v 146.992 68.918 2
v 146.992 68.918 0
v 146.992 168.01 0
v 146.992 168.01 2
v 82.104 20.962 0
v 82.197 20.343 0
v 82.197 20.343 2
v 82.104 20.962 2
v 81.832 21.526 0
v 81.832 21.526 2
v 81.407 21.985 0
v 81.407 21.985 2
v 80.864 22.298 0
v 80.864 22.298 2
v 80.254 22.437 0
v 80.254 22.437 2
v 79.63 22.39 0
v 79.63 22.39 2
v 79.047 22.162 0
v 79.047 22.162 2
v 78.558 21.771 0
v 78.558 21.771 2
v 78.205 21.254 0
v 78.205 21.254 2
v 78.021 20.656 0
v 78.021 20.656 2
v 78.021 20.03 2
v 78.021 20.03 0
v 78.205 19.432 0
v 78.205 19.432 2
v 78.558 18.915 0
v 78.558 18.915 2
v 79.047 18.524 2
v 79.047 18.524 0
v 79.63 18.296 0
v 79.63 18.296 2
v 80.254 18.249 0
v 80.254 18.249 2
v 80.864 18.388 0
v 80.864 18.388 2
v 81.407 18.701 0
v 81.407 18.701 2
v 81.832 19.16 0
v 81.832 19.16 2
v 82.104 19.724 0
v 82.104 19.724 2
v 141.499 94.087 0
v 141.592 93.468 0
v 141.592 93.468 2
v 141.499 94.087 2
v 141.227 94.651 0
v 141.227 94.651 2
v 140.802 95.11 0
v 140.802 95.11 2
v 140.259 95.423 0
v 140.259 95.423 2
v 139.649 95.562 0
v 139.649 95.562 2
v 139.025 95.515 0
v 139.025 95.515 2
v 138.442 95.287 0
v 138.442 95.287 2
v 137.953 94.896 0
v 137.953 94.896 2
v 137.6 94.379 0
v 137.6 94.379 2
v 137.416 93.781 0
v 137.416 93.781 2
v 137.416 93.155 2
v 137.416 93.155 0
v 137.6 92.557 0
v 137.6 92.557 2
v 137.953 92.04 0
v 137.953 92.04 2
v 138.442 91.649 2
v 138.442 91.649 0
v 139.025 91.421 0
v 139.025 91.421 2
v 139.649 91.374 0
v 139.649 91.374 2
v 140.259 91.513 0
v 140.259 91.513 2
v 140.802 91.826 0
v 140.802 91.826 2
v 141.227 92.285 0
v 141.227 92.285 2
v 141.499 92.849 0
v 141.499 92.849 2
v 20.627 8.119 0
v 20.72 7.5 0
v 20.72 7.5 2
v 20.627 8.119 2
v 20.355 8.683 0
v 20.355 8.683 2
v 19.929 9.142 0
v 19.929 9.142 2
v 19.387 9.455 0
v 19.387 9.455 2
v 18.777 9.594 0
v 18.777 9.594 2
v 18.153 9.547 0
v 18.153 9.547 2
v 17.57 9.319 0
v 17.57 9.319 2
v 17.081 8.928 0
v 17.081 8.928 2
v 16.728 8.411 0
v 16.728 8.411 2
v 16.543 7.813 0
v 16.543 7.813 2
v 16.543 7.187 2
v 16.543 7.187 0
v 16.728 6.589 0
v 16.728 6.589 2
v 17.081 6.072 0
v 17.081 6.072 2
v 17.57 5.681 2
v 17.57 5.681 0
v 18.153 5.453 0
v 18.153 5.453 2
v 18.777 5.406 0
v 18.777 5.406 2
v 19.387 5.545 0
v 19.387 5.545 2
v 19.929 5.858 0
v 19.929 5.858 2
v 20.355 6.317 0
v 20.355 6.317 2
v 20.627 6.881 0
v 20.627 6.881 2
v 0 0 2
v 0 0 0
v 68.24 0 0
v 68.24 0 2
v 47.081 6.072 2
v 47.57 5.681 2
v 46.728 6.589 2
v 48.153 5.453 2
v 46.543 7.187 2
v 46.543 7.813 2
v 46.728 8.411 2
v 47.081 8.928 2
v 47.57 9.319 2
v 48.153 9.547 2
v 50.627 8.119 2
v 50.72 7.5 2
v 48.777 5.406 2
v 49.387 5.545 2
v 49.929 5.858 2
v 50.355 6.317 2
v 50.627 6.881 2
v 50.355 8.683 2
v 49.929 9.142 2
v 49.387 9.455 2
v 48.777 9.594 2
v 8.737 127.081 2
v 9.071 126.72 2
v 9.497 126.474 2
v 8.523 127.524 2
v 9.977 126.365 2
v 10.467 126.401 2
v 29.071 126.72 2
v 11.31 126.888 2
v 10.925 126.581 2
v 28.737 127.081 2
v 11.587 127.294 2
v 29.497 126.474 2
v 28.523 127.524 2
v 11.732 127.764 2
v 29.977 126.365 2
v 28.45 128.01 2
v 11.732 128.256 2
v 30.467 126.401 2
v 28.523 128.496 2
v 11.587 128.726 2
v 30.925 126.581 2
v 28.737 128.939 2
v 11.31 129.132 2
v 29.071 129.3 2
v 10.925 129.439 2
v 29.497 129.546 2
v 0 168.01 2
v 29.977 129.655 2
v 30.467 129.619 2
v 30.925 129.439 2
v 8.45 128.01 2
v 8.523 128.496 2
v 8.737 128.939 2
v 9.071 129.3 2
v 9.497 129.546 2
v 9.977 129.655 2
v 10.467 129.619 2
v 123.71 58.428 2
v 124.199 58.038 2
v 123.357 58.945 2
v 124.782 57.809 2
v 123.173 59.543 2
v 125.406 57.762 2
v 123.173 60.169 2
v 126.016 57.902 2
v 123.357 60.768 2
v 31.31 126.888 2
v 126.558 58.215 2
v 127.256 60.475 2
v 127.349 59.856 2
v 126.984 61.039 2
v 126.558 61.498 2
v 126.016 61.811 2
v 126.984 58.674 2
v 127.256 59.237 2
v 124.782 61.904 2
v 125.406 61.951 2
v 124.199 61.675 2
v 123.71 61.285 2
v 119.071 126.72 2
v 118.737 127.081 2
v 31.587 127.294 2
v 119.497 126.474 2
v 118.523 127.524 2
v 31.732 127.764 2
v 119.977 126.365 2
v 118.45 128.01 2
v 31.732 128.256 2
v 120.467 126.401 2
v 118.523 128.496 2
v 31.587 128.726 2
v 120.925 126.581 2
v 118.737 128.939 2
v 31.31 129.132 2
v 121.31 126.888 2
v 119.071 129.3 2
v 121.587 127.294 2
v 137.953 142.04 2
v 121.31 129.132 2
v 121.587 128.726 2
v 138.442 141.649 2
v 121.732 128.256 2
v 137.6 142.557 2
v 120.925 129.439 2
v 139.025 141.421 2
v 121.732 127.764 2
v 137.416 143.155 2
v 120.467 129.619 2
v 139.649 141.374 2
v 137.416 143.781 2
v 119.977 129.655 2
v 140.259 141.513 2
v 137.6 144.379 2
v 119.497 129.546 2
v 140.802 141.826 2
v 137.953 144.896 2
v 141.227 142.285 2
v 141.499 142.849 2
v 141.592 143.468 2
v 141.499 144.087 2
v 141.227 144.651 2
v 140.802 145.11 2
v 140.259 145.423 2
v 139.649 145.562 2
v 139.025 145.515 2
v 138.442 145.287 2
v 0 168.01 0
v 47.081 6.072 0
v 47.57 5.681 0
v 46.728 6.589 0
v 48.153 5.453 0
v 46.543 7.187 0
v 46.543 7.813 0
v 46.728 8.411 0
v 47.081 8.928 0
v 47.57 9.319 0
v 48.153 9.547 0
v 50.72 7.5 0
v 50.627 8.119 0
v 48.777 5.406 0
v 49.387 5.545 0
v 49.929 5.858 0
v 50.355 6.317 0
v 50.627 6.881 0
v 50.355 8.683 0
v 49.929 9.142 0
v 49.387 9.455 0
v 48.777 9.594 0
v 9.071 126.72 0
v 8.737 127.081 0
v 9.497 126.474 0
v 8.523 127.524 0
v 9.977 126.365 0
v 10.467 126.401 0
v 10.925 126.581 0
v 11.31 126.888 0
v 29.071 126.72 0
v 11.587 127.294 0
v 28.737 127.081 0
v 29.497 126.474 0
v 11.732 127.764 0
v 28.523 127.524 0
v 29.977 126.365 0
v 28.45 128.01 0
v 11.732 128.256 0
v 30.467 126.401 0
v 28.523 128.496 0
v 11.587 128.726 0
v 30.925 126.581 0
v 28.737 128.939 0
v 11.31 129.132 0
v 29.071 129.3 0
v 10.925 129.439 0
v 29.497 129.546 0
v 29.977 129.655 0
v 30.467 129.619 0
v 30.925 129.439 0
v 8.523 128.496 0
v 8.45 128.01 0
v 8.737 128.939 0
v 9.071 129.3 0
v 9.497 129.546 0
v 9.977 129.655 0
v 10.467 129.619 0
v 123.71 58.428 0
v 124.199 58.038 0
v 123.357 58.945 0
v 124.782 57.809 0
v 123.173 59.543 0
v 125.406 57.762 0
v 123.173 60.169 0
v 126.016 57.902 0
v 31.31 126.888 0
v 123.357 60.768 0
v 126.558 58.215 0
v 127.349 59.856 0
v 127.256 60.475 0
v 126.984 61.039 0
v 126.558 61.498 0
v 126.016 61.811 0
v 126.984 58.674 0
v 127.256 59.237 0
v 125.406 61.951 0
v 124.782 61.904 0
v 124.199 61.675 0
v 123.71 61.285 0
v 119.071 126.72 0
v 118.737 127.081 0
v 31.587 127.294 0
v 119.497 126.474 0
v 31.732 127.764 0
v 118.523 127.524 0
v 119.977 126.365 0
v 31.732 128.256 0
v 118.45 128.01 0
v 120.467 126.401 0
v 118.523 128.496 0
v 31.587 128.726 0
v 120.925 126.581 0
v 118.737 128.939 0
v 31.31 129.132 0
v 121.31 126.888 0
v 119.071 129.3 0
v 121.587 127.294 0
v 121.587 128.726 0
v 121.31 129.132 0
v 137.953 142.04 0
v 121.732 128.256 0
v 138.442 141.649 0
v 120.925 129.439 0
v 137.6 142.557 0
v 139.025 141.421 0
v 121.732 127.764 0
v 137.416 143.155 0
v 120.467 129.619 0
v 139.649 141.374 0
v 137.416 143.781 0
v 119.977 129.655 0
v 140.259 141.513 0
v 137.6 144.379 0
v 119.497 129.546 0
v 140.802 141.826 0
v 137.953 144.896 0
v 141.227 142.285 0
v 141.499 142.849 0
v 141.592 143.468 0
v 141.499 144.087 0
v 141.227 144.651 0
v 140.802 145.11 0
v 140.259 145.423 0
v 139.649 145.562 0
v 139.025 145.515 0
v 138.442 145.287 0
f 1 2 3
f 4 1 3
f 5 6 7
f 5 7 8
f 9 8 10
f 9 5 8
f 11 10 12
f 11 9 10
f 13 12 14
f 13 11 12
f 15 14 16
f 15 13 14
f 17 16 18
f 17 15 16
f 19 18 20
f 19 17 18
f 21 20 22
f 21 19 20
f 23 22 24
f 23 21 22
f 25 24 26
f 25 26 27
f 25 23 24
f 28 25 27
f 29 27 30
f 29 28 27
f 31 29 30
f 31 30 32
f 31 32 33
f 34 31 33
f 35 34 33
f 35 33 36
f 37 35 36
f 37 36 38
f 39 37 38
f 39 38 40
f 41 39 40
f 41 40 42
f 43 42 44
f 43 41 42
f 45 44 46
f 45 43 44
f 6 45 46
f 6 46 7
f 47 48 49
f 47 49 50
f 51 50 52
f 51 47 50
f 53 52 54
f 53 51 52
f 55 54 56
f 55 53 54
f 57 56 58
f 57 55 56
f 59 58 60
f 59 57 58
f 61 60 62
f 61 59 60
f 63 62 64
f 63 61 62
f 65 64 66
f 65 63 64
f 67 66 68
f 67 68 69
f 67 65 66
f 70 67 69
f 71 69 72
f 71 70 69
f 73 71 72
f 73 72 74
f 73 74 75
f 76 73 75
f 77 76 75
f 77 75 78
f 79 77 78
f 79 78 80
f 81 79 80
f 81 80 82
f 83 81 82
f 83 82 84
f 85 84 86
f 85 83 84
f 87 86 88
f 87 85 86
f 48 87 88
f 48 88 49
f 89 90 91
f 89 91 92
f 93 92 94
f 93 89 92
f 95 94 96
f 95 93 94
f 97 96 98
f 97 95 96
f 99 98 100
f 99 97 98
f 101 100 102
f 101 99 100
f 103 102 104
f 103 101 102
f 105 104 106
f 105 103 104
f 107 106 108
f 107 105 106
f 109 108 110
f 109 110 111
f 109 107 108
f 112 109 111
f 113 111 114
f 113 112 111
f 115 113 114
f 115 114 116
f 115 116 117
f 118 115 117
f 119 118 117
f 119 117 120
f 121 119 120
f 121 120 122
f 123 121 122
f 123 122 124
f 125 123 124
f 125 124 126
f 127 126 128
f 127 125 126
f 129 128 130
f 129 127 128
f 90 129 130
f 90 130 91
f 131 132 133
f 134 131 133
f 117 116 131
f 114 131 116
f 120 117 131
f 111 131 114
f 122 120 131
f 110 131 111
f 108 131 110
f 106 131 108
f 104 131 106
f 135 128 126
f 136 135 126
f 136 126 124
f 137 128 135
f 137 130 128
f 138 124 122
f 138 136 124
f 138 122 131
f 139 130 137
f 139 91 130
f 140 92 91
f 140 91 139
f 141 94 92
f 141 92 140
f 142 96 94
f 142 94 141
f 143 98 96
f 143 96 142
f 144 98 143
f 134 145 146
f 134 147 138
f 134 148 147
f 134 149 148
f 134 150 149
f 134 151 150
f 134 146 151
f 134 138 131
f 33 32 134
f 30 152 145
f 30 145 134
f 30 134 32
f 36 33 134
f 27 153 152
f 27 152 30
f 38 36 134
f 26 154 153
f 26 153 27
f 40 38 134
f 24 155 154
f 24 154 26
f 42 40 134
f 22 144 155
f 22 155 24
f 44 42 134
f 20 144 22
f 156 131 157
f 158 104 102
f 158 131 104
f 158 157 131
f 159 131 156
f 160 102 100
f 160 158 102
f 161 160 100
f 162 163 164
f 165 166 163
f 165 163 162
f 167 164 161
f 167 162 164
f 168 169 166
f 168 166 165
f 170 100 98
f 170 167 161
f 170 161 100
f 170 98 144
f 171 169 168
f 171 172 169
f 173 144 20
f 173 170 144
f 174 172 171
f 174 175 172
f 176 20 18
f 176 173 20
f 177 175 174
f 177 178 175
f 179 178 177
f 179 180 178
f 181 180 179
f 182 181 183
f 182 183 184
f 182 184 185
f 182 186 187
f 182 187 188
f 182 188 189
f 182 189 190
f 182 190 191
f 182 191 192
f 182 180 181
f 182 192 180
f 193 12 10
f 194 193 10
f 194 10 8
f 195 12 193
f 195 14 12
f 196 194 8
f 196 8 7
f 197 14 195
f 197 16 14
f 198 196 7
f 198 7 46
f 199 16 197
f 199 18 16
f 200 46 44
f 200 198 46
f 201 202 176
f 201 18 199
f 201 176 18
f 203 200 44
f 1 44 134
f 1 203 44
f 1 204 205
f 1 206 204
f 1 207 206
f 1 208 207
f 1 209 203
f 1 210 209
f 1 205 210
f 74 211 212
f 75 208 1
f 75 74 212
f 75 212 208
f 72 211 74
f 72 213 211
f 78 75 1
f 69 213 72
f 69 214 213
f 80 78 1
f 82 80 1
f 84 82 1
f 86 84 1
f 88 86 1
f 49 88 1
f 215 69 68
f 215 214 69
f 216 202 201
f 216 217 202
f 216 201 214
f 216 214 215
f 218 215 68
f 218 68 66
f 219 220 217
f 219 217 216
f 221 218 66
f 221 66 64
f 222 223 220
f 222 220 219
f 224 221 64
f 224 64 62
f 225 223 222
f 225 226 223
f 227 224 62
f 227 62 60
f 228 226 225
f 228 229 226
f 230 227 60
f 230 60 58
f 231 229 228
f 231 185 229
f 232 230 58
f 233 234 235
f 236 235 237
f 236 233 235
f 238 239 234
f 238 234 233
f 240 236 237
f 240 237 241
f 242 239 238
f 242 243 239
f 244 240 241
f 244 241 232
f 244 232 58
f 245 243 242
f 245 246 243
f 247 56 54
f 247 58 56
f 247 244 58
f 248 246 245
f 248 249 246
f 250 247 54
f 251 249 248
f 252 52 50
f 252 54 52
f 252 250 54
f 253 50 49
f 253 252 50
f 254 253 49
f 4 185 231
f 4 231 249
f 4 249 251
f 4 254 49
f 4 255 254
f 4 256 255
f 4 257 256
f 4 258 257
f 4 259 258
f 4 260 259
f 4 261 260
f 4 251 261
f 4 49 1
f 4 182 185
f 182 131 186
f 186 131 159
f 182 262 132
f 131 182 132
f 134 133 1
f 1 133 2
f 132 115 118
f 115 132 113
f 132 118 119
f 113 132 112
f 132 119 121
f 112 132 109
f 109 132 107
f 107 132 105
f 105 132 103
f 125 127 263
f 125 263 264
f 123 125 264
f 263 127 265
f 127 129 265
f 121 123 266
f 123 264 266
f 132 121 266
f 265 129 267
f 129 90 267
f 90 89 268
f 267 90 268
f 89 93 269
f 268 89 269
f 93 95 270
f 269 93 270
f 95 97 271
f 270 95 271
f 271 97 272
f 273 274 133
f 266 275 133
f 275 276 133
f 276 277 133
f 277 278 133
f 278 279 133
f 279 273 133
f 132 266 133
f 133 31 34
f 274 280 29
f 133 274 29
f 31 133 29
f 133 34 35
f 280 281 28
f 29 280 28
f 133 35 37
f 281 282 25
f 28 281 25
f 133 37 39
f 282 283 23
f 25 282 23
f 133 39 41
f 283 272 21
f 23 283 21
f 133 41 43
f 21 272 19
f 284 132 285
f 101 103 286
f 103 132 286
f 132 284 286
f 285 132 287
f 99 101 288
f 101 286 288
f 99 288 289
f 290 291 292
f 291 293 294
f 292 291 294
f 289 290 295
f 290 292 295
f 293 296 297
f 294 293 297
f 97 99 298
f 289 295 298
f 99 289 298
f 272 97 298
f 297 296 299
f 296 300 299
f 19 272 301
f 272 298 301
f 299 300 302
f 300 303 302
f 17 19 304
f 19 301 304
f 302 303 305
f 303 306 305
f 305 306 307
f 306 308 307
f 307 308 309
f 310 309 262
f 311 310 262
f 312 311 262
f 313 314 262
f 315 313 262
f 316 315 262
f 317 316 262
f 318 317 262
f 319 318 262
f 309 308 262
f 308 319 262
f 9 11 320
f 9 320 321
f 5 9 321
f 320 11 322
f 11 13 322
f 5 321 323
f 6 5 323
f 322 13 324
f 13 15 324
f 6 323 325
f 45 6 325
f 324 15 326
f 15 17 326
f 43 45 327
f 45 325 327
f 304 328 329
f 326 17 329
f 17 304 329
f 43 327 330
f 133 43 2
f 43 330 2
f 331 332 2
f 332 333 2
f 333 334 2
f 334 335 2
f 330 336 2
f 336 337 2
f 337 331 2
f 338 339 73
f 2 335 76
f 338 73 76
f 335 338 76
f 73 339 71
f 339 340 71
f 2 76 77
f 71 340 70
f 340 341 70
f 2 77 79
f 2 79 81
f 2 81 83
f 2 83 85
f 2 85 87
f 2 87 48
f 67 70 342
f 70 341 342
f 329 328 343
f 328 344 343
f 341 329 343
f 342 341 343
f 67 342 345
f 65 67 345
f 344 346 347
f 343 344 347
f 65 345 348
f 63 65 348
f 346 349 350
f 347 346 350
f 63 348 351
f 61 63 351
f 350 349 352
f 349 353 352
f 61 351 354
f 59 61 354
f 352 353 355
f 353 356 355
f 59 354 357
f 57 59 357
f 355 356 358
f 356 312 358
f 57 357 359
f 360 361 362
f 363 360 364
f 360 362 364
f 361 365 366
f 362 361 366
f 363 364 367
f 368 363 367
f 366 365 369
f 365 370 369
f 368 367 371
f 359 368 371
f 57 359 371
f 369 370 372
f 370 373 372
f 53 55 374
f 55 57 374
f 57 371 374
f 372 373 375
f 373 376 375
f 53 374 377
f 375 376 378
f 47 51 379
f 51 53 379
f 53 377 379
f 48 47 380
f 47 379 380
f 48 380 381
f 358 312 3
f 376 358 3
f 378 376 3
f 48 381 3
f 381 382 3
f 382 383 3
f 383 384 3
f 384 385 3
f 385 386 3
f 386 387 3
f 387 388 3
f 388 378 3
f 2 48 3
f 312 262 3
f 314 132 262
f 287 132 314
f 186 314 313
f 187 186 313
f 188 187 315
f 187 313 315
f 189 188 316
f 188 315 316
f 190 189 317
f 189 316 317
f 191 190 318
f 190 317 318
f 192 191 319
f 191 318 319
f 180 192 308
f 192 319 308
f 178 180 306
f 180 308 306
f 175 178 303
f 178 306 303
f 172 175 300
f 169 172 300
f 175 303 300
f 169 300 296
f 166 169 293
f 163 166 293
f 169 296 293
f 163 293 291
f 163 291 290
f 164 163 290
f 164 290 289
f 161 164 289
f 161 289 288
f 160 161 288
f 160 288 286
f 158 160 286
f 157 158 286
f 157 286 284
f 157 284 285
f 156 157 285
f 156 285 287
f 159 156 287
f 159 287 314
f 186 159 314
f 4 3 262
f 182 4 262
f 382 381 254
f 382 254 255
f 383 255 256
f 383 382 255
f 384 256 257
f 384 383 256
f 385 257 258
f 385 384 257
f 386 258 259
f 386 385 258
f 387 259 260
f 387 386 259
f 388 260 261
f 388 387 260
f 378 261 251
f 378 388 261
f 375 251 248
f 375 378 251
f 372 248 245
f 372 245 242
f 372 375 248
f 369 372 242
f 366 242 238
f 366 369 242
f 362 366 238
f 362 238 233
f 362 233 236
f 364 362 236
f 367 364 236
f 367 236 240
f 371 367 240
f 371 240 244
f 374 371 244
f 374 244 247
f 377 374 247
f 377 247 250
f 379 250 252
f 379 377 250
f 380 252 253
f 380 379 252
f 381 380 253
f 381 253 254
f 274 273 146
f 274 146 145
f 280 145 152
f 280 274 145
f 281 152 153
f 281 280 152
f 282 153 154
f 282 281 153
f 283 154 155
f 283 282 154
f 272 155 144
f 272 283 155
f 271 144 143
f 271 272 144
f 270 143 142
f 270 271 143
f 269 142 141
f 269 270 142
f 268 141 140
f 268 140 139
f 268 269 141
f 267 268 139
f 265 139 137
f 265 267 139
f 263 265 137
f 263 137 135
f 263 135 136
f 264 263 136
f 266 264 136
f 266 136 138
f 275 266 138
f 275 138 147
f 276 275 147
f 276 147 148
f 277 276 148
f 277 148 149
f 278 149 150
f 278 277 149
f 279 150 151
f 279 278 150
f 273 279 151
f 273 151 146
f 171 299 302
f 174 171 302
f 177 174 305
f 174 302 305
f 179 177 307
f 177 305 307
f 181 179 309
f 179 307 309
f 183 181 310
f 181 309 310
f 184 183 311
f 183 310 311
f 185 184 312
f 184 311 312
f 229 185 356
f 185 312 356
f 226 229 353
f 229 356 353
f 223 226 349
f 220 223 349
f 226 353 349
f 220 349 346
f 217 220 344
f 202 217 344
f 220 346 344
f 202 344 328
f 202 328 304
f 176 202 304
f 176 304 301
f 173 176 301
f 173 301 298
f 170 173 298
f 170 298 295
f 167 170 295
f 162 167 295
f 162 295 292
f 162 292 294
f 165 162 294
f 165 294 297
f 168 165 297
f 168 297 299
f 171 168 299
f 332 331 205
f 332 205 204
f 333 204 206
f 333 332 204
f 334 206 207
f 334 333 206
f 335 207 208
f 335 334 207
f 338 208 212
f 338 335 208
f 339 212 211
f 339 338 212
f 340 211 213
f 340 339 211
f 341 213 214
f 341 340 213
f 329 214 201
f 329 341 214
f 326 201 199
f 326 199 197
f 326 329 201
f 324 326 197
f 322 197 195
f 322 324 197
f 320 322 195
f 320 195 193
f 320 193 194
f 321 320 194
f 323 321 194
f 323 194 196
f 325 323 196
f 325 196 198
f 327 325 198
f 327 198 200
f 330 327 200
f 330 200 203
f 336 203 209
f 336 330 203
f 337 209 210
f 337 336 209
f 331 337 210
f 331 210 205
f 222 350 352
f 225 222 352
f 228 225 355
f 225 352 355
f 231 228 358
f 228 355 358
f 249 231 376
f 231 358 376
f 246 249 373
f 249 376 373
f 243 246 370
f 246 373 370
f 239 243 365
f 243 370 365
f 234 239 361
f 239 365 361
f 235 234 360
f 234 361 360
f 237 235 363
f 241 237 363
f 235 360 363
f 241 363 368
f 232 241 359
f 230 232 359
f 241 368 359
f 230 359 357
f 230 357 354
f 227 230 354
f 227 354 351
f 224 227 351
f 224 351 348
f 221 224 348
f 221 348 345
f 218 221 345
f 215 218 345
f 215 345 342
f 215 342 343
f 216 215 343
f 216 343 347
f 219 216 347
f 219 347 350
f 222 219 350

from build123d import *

# Parameters (mm, degrees)
SKETCH_1_R          = 2.1
EXTRUDE_1_DEPTH     = 2
SKETCH_3_R          = 1
CUT_EXTRUDE_1_DEPTH = 10
M4X0_7_1_D          = 3.3
M4X0_7_1_DEPTH      = 11.5
M4X0_7_1_TIP        = 0.991420021


with BuildPart() as part:
    # ｽｹｯﾁ1 → ﾎﾞｽ - 押し出し1 (new body)
    with BuildSketch(Plane.XY):
        Polygon((0, 0), (68.24, 0), (146.992249894, 68.918108191), (146.992249894, 168.01), (0, 168.01), align=None)
        with Locations((18.62, 7.5)):
            Circle(SKETCH_1_R, mode=Mode.SUBTRACT)
        with Locations((48.62, 7.5)):
            Circle(SKETCH_1_R, mode=Mode.SUBTRACT)
        with Locations((139.492249894, 93.468108191)):
            Circle(SKETCH_1_R, mode=Mode.SUBTRACT)
        with Locations((139.492249894, 143.468108191)):
            Circle(SKETCH_1_R, mode=Mode.SUBTRACT)
        with Locations((125.249072144, 59.856479125)):
            Circle(SKETCH_1_R, mode=Mode.SUBTRACT)
        with Locations((80.097280518, 20.342991391)):
            Circle(SKETCH_1_R, mode=Mode.SUBTRACT)
    extrude(amount=EXTRUDE_1_DEPTH)

    # ｽｹｯﾁ3 → ｶｯﾄ - 押し出し1 (cut)
    with BuildSketch(Plane.XY.offset(2)):
        with Locations((10.1, 128.01)):
            Circle(SKETCH_3_R)
        with Locations((30.1, 128.01)):
            Circle(SKETCH_3_R)
        with Locations((120.1, 128.01)):
            Circle(SKETCH_3_R)
    extrude(amount=-CUT_EXTRUDE_1_DEPTH, mode=Mode.SUBTRACT)

    # M4x0.7 ねじ穴1
    with Locations(Plane(origin=(10.1, 128.01, 2), x_dir=(1, 0, 0), z_dir=(0, 0, 1))):
        with Locations((0, 0), (20, 0), (110, 0)):
            Hole(M4X0_7_1_D / 2, depth=M4X0_7_1_DEPTH)
            with Locations((0, 0, -(M4X0_7_1_DEPTH + M4X0_7_1_TIP / 2))):  # 118° drill point
                Cone(0, M4X0_7_1_D / 2, M4X0_7_1_TIP, mode=Mode.SUBTRACT)


solid = part.part
